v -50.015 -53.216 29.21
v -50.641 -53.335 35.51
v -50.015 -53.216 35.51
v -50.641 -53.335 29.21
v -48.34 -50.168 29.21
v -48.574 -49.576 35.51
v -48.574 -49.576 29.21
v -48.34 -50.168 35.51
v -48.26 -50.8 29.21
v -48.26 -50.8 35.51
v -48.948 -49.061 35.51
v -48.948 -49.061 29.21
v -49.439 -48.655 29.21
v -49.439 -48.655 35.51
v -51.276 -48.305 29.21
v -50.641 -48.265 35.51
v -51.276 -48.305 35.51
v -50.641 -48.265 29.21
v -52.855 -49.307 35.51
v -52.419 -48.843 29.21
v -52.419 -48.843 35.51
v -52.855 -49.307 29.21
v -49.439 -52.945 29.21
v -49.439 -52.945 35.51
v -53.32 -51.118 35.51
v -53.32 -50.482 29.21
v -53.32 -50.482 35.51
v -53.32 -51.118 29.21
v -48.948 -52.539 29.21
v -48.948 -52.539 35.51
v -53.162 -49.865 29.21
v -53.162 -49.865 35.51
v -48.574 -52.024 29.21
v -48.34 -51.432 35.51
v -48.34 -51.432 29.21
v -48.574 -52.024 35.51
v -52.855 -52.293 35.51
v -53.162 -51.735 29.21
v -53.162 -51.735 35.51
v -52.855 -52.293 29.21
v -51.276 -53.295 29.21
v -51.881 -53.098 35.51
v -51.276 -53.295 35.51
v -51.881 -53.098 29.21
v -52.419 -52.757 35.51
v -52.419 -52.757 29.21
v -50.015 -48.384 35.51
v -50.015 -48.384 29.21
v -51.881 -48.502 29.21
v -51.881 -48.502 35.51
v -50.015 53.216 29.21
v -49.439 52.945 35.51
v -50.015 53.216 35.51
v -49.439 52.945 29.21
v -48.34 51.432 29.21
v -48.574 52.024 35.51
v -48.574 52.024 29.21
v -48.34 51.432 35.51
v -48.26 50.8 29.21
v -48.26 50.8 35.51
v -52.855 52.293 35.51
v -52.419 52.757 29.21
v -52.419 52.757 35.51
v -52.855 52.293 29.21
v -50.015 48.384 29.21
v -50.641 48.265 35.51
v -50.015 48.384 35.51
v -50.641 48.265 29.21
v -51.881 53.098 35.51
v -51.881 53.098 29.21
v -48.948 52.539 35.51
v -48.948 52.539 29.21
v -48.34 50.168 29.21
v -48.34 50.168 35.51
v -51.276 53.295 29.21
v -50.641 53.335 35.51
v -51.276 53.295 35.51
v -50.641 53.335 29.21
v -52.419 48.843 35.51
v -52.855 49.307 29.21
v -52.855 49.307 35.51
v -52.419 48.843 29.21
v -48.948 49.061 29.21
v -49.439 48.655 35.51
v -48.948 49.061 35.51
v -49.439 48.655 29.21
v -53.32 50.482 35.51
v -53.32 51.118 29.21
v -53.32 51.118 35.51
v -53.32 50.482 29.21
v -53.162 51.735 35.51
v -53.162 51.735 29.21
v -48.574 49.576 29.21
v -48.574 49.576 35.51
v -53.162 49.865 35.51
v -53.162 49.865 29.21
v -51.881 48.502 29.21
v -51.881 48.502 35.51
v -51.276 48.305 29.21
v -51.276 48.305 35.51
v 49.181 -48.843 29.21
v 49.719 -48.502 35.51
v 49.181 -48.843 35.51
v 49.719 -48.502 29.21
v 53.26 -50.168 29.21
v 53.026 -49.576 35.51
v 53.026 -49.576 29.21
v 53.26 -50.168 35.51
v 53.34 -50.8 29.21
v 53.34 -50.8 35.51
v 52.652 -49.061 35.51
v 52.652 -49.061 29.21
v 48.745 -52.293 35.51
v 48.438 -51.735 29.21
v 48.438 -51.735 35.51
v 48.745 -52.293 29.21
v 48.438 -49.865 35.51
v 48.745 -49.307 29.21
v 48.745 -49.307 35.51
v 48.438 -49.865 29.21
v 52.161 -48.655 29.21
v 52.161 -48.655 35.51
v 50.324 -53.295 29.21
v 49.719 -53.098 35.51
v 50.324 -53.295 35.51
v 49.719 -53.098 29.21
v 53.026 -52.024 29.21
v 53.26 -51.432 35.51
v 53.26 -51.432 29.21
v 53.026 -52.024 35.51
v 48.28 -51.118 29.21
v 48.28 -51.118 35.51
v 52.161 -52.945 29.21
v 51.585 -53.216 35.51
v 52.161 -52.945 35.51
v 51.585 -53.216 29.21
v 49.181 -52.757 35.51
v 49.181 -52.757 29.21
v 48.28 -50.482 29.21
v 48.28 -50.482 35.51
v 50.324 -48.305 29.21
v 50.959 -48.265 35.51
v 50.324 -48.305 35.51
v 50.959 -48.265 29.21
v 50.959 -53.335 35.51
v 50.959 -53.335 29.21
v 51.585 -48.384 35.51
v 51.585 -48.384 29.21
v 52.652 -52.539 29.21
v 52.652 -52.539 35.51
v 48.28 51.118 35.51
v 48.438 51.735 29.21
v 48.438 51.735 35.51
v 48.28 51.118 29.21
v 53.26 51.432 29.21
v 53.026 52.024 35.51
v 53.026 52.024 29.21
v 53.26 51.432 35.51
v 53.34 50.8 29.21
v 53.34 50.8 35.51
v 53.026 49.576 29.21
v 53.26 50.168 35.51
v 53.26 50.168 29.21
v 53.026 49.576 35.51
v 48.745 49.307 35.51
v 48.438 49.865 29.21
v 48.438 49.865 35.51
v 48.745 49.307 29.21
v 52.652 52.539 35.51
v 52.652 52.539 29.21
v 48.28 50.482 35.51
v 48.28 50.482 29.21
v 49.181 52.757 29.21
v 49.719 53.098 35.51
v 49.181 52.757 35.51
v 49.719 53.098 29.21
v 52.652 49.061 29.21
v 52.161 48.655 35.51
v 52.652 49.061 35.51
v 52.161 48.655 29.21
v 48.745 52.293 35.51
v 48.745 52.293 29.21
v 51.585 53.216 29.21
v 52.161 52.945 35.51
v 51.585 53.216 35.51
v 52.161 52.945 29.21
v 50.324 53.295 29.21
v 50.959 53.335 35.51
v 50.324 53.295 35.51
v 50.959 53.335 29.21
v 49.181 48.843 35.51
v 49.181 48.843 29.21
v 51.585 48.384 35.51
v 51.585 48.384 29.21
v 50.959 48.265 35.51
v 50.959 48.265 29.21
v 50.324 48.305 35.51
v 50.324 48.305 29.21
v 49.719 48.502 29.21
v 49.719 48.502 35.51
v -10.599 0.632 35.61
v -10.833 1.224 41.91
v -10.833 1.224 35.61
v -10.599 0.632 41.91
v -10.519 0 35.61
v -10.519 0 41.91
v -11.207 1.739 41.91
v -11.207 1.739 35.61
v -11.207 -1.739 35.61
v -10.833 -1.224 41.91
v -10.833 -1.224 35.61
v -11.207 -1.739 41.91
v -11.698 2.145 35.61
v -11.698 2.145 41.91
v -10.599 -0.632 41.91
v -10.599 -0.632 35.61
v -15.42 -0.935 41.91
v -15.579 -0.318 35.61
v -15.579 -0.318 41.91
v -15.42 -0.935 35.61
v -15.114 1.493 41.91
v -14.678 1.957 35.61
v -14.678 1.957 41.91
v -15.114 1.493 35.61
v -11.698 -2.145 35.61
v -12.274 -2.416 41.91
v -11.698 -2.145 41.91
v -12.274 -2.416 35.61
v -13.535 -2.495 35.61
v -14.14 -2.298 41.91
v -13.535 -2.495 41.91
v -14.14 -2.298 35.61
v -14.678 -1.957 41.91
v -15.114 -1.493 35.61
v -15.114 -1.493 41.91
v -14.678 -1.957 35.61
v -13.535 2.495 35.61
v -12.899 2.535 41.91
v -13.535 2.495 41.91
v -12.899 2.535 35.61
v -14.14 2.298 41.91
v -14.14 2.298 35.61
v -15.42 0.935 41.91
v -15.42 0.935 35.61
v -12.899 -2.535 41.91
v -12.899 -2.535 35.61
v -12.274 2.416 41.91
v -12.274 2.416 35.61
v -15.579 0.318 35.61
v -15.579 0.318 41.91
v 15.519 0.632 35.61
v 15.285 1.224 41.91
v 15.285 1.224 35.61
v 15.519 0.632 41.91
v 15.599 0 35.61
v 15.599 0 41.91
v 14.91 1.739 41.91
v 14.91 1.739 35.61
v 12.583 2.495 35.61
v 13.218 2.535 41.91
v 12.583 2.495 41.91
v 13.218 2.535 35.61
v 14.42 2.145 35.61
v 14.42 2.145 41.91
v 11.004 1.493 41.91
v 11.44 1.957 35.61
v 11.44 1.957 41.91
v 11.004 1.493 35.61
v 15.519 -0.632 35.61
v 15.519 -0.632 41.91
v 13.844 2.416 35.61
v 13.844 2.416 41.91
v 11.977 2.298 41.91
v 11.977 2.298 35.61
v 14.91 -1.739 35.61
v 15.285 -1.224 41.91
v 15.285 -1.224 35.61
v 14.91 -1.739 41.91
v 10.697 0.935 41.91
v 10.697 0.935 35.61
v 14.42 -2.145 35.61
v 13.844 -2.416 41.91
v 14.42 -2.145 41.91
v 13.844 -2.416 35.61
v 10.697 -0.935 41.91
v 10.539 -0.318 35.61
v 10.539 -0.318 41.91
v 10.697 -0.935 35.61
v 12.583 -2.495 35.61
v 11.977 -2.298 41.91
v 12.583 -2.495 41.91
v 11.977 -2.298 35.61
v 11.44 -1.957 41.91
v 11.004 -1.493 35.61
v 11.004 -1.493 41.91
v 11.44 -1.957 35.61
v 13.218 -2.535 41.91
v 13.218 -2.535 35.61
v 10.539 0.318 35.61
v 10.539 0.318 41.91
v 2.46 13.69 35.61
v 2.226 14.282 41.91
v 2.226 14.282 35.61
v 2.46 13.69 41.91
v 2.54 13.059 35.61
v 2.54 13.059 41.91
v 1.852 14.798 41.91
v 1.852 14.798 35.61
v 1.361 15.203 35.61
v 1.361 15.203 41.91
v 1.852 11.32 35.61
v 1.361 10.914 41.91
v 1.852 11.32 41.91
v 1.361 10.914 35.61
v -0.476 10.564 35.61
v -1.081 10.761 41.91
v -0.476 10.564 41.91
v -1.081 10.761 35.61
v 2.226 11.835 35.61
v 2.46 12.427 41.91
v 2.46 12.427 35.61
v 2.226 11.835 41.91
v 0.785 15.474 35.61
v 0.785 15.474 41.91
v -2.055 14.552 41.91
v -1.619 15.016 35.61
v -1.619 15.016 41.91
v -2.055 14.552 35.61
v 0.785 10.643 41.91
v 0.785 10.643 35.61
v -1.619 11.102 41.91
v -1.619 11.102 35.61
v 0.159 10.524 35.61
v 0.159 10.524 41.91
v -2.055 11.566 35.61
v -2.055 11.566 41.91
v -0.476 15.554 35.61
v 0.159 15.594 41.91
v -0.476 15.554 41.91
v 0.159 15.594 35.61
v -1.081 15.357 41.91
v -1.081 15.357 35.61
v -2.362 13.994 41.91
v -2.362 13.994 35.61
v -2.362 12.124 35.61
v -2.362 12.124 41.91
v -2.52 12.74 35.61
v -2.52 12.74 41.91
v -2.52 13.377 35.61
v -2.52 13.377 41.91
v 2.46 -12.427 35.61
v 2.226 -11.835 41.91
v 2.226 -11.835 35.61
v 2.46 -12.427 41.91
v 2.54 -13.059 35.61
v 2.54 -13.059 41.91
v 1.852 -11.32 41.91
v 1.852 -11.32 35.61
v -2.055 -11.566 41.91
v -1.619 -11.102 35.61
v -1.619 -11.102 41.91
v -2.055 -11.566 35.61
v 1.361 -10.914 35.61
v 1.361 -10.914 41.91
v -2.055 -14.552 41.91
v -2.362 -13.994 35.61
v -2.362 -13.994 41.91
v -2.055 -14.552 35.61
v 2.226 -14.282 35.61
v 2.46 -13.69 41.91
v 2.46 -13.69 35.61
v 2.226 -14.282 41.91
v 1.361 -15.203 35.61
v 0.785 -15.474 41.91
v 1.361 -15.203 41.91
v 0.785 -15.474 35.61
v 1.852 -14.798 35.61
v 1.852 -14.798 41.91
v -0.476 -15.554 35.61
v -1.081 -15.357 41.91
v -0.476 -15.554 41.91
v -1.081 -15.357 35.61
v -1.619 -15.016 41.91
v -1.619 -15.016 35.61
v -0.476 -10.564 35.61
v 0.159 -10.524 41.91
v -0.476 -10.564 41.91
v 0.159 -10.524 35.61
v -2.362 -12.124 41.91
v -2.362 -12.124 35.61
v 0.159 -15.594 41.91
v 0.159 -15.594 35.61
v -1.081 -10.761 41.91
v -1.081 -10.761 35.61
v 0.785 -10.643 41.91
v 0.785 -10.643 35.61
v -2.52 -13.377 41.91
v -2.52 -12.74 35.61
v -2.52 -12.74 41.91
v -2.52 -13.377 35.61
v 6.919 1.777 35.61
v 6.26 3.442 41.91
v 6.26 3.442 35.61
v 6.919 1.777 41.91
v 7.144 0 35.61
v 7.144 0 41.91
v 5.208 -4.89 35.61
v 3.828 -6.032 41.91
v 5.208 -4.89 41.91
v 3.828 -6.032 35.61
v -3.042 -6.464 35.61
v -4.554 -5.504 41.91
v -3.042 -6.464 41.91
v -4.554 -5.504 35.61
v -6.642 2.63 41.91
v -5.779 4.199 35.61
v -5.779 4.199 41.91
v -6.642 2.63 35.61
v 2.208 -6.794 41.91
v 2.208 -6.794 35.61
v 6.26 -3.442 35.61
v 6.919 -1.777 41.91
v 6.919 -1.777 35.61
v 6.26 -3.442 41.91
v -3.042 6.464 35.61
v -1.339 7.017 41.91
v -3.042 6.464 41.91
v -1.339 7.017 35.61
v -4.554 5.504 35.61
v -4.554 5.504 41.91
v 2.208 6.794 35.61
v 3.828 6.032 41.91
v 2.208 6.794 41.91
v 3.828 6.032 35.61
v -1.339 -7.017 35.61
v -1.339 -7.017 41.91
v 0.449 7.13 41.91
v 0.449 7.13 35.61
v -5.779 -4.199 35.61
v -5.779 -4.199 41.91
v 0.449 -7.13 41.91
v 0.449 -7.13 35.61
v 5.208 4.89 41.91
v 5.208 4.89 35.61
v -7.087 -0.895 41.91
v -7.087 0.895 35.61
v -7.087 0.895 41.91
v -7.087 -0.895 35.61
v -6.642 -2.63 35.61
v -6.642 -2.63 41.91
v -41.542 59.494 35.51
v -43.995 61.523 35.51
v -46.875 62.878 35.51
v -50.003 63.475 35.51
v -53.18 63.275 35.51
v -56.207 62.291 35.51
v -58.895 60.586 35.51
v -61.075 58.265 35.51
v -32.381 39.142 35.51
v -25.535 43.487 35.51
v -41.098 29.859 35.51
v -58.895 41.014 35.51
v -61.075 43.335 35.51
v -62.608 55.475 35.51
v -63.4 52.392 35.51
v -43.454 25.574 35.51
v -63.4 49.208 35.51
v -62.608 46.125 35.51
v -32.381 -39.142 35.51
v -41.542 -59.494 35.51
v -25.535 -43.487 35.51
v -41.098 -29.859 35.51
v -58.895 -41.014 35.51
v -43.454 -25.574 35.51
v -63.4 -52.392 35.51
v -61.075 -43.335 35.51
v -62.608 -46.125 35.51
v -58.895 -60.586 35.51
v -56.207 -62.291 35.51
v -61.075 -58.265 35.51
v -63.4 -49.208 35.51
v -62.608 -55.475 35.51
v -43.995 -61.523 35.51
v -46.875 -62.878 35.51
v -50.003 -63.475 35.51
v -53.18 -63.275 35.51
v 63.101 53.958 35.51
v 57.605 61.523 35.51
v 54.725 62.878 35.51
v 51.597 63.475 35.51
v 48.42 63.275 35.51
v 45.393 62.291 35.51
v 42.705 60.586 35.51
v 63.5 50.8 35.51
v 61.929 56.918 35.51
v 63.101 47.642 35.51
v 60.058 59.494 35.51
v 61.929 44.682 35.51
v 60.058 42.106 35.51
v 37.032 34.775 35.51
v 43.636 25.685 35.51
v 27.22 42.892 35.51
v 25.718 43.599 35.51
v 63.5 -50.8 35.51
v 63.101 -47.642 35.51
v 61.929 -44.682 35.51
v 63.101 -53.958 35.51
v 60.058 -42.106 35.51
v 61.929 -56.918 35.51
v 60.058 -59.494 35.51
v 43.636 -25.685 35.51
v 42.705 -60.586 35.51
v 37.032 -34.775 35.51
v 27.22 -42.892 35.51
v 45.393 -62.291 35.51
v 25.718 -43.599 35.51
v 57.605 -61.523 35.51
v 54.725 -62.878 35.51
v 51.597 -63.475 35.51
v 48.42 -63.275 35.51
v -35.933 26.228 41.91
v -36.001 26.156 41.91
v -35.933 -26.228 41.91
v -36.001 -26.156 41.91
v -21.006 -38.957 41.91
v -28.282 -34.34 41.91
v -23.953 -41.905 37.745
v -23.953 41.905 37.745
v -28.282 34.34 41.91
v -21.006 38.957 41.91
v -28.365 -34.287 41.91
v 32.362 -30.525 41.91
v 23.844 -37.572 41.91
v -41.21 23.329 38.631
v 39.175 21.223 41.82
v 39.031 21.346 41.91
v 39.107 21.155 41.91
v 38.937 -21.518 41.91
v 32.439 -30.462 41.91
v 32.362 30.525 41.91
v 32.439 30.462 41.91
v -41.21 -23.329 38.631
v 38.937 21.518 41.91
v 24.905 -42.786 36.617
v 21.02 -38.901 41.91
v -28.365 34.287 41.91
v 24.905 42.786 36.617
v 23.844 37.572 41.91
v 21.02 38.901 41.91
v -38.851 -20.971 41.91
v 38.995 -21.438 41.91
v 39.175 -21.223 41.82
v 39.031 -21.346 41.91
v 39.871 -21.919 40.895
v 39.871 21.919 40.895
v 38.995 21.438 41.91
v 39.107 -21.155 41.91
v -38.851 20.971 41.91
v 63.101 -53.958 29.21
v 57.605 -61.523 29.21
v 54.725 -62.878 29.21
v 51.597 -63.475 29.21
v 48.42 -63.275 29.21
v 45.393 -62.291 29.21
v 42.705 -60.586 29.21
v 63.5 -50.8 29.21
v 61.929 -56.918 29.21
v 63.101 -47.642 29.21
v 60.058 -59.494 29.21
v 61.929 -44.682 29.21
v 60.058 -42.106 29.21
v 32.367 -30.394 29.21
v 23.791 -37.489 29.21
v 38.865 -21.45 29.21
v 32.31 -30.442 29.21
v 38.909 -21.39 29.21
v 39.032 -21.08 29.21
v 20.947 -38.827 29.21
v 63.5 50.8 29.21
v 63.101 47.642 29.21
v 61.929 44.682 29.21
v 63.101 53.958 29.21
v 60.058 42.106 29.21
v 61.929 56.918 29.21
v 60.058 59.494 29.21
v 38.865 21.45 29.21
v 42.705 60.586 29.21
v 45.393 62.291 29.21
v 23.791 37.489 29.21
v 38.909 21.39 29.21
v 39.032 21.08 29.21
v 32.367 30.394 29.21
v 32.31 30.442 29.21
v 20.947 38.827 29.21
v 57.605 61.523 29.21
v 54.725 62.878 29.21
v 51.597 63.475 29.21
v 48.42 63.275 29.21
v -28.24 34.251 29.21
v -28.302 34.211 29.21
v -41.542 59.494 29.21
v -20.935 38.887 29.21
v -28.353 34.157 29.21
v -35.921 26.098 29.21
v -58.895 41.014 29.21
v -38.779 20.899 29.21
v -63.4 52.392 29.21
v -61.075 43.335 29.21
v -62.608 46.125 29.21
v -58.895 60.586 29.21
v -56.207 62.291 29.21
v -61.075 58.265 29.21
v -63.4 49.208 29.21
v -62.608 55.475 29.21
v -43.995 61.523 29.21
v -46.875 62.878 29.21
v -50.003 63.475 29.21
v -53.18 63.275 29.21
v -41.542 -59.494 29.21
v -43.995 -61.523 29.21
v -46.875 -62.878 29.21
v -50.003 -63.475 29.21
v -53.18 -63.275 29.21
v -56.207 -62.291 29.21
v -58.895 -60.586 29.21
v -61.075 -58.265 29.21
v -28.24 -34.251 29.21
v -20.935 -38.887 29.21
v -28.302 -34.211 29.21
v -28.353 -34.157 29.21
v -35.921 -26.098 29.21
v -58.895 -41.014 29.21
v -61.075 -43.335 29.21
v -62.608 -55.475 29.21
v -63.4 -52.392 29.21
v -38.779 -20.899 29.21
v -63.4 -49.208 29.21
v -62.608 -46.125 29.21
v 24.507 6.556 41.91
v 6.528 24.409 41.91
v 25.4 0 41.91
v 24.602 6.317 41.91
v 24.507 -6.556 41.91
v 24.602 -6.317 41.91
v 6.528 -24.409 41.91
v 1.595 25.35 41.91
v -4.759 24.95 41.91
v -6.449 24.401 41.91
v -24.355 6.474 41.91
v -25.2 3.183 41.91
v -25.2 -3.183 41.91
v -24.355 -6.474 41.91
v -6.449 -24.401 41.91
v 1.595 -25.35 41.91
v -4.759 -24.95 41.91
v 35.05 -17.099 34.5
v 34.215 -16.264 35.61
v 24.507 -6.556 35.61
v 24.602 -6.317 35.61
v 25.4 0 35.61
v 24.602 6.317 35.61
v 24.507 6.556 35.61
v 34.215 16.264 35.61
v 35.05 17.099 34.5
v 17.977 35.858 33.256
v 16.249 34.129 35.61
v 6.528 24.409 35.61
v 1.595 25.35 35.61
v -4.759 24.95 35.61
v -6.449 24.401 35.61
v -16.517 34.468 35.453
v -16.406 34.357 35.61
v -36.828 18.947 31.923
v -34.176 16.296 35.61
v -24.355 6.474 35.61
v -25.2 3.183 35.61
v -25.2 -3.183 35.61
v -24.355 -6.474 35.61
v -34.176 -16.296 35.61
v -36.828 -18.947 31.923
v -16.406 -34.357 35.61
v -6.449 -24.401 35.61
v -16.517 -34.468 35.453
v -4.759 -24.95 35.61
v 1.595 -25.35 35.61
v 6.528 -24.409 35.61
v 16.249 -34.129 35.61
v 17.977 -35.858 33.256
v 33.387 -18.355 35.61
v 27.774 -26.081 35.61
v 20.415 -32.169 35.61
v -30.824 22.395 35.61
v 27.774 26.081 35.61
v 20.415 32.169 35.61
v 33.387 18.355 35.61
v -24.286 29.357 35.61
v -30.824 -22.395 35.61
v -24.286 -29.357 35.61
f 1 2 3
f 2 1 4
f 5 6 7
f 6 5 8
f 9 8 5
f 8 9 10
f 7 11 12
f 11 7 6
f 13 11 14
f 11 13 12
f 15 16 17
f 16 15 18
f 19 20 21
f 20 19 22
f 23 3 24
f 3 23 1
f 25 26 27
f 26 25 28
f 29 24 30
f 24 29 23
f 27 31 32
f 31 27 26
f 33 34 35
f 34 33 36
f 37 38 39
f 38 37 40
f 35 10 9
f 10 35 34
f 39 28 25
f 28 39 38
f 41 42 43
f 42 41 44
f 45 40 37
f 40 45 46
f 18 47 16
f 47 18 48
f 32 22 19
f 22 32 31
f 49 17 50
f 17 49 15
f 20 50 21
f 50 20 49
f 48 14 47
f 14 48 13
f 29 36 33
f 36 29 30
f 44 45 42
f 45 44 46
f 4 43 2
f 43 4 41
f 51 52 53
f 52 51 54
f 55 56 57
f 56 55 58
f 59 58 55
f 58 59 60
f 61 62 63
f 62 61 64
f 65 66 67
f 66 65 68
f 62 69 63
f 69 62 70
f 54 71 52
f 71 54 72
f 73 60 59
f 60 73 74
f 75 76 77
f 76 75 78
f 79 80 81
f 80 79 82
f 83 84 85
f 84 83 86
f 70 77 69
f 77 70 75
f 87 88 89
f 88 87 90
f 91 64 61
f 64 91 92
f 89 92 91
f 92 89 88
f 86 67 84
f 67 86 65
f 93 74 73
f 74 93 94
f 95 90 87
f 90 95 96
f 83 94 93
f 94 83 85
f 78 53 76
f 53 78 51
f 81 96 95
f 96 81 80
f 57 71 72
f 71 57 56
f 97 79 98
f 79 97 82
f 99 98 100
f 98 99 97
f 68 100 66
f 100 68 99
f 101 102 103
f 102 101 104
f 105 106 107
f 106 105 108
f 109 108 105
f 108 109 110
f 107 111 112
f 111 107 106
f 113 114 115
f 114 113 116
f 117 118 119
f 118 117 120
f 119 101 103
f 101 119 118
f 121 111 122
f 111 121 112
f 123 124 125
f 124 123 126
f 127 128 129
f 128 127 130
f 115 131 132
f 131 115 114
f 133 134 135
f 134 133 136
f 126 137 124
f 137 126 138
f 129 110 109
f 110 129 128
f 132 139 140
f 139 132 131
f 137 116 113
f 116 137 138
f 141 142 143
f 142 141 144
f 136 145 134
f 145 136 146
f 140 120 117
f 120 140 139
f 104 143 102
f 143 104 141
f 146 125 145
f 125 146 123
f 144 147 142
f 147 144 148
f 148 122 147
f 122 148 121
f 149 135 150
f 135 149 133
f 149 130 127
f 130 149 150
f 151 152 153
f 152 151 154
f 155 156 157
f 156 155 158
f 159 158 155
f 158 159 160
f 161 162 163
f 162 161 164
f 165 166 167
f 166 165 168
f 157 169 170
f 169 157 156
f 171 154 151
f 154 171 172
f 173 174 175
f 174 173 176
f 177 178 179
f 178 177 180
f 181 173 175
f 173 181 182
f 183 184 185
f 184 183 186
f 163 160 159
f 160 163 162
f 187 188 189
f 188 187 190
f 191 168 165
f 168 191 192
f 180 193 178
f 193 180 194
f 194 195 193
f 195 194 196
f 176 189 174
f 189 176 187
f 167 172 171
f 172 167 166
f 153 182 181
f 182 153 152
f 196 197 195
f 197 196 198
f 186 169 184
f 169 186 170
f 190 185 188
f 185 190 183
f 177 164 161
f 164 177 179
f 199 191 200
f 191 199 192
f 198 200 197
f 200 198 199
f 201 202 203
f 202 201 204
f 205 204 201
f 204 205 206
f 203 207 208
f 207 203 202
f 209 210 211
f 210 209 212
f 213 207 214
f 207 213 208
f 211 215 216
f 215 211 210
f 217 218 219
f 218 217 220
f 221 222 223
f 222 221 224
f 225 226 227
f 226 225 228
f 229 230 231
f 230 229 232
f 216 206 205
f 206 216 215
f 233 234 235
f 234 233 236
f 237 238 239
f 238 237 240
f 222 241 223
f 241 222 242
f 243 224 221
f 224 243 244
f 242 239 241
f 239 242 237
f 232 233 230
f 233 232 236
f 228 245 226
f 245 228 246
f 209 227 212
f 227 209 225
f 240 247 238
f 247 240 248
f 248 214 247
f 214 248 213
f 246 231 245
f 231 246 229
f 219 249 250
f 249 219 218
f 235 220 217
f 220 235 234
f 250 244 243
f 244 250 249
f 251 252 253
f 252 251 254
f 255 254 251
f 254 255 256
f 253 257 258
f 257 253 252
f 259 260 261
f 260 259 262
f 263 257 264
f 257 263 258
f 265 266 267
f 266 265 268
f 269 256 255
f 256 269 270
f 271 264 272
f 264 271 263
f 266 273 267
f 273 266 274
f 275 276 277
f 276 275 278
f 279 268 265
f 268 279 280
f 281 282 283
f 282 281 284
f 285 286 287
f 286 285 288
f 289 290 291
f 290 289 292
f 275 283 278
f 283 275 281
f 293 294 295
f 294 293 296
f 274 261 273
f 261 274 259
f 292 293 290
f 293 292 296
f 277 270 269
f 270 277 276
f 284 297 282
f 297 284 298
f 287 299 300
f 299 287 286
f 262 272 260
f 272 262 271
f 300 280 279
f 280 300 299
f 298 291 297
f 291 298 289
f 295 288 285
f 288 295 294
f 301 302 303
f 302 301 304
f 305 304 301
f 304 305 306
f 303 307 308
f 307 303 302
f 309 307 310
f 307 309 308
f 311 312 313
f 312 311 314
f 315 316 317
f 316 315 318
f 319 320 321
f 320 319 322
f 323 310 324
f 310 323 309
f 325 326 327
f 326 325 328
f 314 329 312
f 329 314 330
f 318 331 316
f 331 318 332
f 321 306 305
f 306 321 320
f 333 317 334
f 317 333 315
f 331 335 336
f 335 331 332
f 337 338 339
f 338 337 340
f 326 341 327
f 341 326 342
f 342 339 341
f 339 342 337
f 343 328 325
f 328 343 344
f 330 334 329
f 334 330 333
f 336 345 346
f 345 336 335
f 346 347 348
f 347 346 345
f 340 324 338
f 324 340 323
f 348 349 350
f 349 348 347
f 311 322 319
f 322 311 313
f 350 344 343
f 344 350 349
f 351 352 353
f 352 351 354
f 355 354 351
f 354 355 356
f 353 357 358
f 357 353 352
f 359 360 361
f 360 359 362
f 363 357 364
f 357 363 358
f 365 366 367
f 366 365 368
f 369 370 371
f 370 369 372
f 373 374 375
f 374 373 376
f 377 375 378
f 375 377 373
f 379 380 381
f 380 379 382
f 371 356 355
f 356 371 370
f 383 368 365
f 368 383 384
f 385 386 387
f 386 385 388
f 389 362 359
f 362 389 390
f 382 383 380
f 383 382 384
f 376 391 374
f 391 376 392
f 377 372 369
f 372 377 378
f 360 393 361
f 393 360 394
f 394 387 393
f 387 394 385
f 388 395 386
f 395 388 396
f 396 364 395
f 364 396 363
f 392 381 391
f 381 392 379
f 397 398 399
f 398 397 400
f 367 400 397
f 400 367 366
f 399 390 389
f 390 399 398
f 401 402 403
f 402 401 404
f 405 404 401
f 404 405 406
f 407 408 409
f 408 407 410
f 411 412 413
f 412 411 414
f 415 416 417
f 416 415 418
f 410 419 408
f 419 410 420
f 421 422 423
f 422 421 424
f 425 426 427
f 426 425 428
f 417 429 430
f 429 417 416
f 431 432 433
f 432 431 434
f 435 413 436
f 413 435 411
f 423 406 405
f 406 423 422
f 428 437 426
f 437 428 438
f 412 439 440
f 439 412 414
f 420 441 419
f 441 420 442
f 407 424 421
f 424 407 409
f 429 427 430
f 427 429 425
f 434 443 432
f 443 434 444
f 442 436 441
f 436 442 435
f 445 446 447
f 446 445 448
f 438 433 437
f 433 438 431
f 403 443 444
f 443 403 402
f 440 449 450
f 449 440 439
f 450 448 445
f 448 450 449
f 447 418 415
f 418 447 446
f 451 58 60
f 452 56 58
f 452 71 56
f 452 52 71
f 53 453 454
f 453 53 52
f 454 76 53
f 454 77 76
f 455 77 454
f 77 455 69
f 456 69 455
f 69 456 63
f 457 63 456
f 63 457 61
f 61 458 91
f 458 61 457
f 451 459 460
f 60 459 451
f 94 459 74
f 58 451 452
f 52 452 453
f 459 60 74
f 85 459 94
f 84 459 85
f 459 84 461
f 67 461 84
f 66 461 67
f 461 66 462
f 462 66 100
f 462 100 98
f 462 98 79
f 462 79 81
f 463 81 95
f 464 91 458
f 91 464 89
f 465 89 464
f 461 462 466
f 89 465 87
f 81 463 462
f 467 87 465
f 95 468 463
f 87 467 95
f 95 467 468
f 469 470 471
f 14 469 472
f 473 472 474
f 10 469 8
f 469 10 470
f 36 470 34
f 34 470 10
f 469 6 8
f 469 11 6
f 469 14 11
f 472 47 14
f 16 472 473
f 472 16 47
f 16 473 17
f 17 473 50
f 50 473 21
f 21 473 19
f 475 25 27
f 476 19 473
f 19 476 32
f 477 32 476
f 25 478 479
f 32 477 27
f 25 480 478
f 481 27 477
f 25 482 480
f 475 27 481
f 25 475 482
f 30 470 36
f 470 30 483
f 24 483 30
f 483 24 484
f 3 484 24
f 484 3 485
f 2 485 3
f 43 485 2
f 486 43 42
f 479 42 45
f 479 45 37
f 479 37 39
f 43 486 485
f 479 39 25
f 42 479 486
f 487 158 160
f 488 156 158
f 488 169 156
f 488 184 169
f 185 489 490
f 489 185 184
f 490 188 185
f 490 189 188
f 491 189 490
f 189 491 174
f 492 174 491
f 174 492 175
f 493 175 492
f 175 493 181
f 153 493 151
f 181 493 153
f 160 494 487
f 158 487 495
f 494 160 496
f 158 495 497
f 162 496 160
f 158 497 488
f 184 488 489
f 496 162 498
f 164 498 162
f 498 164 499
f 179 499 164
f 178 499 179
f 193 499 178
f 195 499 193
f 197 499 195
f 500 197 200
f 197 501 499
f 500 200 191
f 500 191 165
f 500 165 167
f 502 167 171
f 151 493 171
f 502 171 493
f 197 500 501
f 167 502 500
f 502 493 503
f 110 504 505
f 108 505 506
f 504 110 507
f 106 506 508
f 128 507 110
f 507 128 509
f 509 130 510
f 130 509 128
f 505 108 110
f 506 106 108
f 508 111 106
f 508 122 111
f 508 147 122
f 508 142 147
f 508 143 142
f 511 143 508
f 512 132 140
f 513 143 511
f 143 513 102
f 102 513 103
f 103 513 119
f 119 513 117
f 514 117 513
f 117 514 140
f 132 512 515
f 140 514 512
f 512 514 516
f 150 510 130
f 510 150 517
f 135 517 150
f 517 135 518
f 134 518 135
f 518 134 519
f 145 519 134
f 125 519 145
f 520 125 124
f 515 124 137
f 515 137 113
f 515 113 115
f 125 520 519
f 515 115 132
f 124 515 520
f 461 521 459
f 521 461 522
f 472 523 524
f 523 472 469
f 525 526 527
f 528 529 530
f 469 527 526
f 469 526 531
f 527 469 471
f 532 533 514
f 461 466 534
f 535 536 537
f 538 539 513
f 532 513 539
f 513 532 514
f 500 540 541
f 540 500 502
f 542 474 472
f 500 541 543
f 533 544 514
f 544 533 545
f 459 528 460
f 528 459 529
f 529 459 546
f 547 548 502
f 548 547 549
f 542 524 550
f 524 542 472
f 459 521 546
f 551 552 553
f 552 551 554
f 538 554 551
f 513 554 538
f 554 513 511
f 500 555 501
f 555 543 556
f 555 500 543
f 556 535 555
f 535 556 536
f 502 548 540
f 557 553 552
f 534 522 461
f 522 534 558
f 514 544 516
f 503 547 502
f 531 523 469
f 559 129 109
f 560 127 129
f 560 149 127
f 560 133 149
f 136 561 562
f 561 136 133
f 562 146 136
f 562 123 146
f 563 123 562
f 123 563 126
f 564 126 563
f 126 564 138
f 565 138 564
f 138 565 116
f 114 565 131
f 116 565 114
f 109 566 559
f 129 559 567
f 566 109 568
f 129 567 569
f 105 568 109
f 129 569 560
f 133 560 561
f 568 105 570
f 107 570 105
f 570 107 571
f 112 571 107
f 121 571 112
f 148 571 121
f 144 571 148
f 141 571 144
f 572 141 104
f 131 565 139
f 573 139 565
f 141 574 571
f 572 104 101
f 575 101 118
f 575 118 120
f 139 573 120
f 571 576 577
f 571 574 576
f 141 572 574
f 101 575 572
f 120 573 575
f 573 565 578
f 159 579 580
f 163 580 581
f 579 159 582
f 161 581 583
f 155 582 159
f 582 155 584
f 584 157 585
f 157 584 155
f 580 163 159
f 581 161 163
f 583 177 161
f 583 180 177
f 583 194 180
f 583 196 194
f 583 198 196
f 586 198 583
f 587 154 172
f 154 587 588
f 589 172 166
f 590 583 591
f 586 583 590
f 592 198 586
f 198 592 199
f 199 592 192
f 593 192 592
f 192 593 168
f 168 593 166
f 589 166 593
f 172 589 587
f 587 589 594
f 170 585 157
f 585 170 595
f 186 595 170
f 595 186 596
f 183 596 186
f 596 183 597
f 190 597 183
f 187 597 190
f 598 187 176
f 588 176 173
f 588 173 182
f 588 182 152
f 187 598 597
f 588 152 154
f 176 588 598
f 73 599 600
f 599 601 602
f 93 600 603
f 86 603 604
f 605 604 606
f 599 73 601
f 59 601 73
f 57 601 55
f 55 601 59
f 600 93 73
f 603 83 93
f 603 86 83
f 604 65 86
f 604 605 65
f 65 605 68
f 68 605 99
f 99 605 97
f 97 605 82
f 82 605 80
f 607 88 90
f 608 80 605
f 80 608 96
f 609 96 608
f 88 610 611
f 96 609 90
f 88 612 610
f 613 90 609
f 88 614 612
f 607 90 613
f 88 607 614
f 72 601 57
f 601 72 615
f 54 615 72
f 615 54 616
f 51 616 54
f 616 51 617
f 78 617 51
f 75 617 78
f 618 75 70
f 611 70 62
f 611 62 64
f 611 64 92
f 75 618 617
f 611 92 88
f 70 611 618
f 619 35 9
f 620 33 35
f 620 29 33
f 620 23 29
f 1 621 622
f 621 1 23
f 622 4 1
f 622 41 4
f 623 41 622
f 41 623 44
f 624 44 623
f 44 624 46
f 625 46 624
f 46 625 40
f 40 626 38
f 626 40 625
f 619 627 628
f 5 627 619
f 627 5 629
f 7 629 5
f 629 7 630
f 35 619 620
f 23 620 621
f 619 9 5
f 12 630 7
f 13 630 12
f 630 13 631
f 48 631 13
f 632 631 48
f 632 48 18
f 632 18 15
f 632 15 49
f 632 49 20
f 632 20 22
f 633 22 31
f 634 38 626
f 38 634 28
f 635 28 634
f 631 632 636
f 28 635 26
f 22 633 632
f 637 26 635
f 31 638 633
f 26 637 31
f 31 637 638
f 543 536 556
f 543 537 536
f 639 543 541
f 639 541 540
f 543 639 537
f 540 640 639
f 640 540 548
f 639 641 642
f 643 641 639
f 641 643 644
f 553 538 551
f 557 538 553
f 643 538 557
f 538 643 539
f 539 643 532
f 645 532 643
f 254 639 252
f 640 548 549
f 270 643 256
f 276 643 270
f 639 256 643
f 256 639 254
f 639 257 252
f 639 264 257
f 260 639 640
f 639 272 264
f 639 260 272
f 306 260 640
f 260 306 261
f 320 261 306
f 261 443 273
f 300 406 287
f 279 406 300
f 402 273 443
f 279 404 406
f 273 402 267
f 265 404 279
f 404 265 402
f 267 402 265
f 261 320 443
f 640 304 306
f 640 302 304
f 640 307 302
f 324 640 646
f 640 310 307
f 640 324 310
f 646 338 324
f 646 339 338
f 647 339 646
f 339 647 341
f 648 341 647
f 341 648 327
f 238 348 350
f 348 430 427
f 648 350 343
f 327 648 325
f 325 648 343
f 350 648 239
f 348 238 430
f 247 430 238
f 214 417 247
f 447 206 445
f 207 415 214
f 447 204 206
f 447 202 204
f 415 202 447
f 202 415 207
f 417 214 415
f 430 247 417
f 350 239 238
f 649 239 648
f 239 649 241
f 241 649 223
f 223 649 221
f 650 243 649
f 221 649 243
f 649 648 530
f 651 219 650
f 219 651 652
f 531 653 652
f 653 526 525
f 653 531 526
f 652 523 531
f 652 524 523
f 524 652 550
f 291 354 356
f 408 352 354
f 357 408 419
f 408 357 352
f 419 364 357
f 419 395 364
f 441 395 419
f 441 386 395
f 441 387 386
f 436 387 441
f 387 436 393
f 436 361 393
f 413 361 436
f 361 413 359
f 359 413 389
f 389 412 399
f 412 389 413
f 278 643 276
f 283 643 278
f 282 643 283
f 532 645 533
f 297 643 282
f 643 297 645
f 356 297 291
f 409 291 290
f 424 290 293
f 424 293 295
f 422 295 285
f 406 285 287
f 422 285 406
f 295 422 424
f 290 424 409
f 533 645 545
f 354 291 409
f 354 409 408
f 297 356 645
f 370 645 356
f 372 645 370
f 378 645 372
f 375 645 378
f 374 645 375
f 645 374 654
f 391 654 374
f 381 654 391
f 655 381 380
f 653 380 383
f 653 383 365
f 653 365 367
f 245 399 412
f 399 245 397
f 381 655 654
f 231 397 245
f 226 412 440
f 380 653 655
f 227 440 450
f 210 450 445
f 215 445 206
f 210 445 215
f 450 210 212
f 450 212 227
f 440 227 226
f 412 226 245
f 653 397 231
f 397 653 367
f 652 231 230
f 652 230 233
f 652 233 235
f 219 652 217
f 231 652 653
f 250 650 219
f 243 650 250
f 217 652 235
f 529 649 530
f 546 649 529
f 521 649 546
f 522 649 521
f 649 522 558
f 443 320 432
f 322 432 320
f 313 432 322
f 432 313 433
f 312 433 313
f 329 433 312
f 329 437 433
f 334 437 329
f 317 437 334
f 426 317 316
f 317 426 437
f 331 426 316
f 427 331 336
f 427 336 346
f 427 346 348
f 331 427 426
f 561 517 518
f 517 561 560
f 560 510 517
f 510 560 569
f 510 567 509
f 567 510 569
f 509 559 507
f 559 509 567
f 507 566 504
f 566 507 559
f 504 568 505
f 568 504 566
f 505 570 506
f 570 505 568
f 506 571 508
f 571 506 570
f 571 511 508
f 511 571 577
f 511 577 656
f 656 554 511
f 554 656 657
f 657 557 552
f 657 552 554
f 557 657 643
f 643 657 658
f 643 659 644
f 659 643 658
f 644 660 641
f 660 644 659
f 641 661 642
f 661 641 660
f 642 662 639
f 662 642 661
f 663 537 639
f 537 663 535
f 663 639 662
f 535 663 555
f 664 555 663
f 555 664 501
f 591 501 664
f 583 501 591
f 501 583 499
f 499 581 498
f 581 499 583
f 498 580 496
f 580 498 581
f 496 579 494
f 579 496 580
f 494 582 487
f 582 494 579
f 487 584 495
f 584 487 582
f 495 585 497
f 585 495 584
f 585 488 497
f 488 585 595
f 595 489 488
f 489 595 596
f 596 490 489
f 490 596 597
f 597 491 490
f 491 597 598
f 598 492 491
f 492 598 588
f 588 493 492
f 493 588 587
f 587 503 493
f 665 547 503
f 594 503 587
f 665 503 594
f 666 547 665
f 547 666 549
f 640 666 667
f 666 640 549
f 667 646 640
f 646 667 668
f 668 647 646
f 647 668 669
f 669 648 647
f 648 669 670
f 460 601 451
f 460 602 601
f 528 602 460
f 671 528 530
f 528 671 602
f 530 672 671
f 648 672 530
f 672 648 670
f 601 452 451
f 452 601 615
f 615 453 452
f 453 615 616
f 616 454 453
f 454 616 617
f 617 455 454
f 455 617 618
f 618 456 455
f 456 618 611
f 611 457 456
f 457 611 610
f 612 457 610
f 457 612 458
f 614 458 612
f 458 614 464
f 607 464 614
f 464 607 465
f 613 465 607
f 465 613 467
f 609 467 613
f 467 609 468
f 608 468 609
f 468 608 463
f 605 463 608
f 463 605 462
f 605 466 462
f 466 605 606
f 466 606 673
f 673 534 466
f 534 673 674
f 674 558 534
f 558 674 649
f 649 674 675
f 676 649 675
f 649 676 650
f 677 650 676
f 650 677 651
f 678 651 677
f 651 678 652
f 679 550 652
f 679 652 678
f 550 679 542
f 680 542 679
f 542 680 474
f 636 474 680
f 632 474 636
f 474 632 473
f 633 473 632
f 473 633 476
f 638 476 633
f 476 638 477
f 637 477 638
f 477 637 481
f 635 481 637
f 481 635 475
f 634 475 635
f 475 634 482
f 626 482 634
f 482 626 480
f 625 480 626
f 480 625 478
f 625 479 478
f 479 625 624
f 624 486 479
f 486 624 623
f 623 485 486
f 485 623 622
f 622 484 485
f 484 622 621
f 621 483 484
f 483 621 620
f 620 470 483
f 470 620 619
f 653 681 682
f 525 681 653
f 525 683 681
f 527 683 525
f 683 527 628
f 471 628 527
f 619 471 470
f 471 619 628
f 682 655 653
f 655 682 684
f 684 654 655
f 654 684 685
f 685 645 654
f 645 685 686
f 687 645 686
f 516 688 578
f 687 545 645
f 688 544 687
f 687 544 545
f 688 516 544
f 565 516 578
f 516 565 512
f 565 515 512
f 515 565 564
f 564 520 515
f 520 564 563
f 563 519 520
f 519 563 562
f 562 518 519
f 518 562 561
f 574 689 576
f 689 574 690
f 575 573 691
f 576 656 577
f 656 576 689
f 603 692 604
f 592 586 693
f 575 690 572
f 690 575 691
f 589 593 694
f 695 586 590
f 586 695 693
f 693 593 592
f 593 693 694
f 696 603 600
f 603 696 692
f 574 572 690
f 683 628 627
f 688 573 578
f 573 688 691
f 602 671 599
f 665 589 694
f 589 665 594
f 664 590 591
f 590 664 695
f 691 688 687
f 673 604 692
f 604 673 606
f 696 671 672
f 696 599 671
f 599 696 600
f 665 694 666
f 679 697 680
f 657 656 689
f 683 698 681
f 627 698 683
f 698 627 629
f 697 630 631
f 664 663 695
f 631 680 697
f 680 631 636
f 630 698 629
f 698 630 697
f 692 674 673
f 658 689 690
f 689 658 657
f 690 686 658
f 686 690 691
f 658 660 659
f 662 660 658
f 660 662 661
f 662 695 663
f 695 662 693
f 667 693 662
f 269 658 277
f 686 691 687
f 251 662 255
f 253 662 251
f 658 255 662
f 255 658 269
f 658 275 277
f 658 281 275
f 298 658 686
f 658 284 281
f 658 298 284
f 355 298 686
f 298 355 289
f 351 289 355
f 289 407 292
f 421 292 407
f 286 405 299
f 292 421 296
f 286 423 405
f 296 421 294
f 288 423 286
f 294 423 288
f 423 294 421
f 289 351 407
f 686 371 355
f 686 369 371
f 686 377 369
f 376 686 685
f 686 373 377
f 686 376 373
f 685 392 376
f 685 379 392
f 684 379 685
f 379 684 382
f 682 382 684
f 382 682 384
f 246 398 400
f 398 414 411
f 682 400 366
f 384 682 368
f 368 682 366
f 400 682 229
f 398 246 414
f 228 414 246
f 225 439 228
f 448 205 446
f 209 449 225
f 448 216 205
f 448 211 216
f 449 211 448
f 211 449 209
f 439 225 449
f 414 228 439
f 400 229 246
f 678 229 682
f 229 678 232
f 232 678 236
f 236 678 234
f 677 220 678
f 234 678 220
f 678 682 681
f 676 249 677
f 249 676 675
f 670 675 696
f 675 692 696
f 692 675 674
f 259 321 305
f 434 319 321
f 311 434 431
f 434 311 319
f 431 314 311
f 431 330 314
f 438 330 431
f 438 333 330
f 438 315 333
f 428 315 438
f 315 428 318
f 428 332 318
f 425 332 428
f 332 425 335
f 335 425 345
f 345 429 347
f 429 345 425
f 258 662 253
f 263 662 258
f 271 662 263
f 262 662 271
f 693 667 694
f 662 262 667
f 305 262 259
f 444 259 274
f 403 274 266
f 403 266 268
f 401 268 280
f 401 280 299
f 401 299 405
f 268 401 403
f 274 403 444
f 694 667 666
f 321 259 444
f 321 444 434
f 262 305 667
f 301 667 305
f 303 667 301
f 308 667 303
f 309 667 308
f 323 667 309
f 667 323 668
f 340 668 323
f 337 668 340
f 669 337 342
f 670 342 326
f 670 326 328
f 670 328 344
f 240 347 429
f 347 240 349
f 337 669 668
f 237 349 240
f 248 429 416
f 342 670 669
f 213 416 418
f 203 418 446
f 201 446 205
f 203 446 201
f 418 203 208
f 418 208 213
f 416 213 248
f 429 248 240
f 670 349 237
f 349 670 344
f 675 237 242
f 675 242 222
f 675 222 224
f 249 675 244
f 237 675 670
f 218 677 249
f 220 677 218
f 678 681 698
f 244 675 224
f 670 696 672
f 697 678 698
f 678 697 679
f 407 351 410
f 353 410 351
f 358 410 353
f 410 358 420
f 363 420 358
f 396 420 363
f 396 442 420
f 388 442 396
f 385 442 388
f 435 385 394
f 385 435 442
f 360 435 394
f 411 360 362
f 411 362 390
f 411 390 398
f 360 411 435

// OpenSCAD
INCH = 25.4;

module motor_bracket(
    motor_bolt_hole_distance = 4*INCH,
    motor_bolt_hole_diameter = 0.2*INCH,
    shaft_hole_diameter = 9/16*INCH,
    arm_width = 1*INCH,
    material_thickness = 1/2*INCH,
    arm_thickness = 1/4*INCH,
    bell_height = 1.4*INCH,
    center_diameter = 2*INCH,
    bushing_diameter = 1.494*INCH,
    bottom_cut_away_diameter = 3*INCH,
) {
    material_cut_away = material_thickness - arm_thickness;
    spacer_height = bell_height - material_cut_away;

    bushing_bolt_radius = (bushing_diameter/2 + shaft_hole_diameter/2)/2;
    
    module shaft_hole() {
        cylinder(d=shaft_hole_diameter, h=10*INCH);
    }
    module motor_bolt_hole() {
        cylinder(d=motor_bolt_hole_diameter, h=10*INCH);
    }
    module motor_bolt_hole_positions() {
        for (x = [-motor_bolt_hole_distance/2, +motor_bolt_hole_distance/2])
        for (y = [-motor_bolt_hole_distance/2, +motor_bolt_hole_distance/2])
        translate([x, y, 0])
        children();
    }
    module motor_bolt_holes() {
        motor_bolt_hole_positions() motor_bolt_hole();
    }
    module bushing_bolt_holes() {
        r = bushing_bolt_radius;
        for (p = [
            [ -r,  0, 0 ],
            [ +r,  0, 0 ],
            [  0, +r, 0 ],
            [  0, -r, 0 ]
        ])
        translate(p)
        motor_bolt_hole();
    }
    module holes() {
        motor_bolt_holes();
        bushing_bolt_holes();
        shaft_hole();
    }

    module bracket_projection() {
        for (x = [-motor_bolt_hole_distance/2, +motor_bolt_hole_distance/2])
        for (y = [-motor_bolt_hole_distance/2, +motor_bolt_hole_distance/2])
        hull() {
           circle(d=arm_width);
           translate([x, y, 0]) circle(d=arm_width);
        }
        circle(d=center_diameter);
    }

    module bottom_cut_away() {
        translate([0, 0, bell_height-material_cut_away-0.05])
        cylinder(
            d2=bottom_cut_away_diameter,
            d1=bottom_cut_away_diameter+2*material_cut_away,
            h=material_cut_away+0.1
        );
    }
    
    module top_cut_away() {
        difference() {
            translate([0, 0, bell_height+material_cut_away/2])
            cube([10*INCH, 10*INCH, material_cut_away+0.1], center=true);
       
            translate([0, 0, bell_height-0.05])
            cylinder(
                d2=bottom_cut_away_diameter+2*material_cut_away,
                d1=bottom_cut_away_diameter+4*material_cut_away,
                h=material_cut_away+0.1
            );
        }
    }

    difference() {
        union() {
            translate([0, 0, spacer_height])
                linear_extrude(material_thickness)
                bracket_projection();

            //color("beige")
            //    motor_bolt_hole_positions()
            //    cylinder(d=arm_width, h=spacer_height);
        }

        holes();
        bottom_cut_away();
        top_cut_away();
    }
}

motor_bracket($fn=25);
